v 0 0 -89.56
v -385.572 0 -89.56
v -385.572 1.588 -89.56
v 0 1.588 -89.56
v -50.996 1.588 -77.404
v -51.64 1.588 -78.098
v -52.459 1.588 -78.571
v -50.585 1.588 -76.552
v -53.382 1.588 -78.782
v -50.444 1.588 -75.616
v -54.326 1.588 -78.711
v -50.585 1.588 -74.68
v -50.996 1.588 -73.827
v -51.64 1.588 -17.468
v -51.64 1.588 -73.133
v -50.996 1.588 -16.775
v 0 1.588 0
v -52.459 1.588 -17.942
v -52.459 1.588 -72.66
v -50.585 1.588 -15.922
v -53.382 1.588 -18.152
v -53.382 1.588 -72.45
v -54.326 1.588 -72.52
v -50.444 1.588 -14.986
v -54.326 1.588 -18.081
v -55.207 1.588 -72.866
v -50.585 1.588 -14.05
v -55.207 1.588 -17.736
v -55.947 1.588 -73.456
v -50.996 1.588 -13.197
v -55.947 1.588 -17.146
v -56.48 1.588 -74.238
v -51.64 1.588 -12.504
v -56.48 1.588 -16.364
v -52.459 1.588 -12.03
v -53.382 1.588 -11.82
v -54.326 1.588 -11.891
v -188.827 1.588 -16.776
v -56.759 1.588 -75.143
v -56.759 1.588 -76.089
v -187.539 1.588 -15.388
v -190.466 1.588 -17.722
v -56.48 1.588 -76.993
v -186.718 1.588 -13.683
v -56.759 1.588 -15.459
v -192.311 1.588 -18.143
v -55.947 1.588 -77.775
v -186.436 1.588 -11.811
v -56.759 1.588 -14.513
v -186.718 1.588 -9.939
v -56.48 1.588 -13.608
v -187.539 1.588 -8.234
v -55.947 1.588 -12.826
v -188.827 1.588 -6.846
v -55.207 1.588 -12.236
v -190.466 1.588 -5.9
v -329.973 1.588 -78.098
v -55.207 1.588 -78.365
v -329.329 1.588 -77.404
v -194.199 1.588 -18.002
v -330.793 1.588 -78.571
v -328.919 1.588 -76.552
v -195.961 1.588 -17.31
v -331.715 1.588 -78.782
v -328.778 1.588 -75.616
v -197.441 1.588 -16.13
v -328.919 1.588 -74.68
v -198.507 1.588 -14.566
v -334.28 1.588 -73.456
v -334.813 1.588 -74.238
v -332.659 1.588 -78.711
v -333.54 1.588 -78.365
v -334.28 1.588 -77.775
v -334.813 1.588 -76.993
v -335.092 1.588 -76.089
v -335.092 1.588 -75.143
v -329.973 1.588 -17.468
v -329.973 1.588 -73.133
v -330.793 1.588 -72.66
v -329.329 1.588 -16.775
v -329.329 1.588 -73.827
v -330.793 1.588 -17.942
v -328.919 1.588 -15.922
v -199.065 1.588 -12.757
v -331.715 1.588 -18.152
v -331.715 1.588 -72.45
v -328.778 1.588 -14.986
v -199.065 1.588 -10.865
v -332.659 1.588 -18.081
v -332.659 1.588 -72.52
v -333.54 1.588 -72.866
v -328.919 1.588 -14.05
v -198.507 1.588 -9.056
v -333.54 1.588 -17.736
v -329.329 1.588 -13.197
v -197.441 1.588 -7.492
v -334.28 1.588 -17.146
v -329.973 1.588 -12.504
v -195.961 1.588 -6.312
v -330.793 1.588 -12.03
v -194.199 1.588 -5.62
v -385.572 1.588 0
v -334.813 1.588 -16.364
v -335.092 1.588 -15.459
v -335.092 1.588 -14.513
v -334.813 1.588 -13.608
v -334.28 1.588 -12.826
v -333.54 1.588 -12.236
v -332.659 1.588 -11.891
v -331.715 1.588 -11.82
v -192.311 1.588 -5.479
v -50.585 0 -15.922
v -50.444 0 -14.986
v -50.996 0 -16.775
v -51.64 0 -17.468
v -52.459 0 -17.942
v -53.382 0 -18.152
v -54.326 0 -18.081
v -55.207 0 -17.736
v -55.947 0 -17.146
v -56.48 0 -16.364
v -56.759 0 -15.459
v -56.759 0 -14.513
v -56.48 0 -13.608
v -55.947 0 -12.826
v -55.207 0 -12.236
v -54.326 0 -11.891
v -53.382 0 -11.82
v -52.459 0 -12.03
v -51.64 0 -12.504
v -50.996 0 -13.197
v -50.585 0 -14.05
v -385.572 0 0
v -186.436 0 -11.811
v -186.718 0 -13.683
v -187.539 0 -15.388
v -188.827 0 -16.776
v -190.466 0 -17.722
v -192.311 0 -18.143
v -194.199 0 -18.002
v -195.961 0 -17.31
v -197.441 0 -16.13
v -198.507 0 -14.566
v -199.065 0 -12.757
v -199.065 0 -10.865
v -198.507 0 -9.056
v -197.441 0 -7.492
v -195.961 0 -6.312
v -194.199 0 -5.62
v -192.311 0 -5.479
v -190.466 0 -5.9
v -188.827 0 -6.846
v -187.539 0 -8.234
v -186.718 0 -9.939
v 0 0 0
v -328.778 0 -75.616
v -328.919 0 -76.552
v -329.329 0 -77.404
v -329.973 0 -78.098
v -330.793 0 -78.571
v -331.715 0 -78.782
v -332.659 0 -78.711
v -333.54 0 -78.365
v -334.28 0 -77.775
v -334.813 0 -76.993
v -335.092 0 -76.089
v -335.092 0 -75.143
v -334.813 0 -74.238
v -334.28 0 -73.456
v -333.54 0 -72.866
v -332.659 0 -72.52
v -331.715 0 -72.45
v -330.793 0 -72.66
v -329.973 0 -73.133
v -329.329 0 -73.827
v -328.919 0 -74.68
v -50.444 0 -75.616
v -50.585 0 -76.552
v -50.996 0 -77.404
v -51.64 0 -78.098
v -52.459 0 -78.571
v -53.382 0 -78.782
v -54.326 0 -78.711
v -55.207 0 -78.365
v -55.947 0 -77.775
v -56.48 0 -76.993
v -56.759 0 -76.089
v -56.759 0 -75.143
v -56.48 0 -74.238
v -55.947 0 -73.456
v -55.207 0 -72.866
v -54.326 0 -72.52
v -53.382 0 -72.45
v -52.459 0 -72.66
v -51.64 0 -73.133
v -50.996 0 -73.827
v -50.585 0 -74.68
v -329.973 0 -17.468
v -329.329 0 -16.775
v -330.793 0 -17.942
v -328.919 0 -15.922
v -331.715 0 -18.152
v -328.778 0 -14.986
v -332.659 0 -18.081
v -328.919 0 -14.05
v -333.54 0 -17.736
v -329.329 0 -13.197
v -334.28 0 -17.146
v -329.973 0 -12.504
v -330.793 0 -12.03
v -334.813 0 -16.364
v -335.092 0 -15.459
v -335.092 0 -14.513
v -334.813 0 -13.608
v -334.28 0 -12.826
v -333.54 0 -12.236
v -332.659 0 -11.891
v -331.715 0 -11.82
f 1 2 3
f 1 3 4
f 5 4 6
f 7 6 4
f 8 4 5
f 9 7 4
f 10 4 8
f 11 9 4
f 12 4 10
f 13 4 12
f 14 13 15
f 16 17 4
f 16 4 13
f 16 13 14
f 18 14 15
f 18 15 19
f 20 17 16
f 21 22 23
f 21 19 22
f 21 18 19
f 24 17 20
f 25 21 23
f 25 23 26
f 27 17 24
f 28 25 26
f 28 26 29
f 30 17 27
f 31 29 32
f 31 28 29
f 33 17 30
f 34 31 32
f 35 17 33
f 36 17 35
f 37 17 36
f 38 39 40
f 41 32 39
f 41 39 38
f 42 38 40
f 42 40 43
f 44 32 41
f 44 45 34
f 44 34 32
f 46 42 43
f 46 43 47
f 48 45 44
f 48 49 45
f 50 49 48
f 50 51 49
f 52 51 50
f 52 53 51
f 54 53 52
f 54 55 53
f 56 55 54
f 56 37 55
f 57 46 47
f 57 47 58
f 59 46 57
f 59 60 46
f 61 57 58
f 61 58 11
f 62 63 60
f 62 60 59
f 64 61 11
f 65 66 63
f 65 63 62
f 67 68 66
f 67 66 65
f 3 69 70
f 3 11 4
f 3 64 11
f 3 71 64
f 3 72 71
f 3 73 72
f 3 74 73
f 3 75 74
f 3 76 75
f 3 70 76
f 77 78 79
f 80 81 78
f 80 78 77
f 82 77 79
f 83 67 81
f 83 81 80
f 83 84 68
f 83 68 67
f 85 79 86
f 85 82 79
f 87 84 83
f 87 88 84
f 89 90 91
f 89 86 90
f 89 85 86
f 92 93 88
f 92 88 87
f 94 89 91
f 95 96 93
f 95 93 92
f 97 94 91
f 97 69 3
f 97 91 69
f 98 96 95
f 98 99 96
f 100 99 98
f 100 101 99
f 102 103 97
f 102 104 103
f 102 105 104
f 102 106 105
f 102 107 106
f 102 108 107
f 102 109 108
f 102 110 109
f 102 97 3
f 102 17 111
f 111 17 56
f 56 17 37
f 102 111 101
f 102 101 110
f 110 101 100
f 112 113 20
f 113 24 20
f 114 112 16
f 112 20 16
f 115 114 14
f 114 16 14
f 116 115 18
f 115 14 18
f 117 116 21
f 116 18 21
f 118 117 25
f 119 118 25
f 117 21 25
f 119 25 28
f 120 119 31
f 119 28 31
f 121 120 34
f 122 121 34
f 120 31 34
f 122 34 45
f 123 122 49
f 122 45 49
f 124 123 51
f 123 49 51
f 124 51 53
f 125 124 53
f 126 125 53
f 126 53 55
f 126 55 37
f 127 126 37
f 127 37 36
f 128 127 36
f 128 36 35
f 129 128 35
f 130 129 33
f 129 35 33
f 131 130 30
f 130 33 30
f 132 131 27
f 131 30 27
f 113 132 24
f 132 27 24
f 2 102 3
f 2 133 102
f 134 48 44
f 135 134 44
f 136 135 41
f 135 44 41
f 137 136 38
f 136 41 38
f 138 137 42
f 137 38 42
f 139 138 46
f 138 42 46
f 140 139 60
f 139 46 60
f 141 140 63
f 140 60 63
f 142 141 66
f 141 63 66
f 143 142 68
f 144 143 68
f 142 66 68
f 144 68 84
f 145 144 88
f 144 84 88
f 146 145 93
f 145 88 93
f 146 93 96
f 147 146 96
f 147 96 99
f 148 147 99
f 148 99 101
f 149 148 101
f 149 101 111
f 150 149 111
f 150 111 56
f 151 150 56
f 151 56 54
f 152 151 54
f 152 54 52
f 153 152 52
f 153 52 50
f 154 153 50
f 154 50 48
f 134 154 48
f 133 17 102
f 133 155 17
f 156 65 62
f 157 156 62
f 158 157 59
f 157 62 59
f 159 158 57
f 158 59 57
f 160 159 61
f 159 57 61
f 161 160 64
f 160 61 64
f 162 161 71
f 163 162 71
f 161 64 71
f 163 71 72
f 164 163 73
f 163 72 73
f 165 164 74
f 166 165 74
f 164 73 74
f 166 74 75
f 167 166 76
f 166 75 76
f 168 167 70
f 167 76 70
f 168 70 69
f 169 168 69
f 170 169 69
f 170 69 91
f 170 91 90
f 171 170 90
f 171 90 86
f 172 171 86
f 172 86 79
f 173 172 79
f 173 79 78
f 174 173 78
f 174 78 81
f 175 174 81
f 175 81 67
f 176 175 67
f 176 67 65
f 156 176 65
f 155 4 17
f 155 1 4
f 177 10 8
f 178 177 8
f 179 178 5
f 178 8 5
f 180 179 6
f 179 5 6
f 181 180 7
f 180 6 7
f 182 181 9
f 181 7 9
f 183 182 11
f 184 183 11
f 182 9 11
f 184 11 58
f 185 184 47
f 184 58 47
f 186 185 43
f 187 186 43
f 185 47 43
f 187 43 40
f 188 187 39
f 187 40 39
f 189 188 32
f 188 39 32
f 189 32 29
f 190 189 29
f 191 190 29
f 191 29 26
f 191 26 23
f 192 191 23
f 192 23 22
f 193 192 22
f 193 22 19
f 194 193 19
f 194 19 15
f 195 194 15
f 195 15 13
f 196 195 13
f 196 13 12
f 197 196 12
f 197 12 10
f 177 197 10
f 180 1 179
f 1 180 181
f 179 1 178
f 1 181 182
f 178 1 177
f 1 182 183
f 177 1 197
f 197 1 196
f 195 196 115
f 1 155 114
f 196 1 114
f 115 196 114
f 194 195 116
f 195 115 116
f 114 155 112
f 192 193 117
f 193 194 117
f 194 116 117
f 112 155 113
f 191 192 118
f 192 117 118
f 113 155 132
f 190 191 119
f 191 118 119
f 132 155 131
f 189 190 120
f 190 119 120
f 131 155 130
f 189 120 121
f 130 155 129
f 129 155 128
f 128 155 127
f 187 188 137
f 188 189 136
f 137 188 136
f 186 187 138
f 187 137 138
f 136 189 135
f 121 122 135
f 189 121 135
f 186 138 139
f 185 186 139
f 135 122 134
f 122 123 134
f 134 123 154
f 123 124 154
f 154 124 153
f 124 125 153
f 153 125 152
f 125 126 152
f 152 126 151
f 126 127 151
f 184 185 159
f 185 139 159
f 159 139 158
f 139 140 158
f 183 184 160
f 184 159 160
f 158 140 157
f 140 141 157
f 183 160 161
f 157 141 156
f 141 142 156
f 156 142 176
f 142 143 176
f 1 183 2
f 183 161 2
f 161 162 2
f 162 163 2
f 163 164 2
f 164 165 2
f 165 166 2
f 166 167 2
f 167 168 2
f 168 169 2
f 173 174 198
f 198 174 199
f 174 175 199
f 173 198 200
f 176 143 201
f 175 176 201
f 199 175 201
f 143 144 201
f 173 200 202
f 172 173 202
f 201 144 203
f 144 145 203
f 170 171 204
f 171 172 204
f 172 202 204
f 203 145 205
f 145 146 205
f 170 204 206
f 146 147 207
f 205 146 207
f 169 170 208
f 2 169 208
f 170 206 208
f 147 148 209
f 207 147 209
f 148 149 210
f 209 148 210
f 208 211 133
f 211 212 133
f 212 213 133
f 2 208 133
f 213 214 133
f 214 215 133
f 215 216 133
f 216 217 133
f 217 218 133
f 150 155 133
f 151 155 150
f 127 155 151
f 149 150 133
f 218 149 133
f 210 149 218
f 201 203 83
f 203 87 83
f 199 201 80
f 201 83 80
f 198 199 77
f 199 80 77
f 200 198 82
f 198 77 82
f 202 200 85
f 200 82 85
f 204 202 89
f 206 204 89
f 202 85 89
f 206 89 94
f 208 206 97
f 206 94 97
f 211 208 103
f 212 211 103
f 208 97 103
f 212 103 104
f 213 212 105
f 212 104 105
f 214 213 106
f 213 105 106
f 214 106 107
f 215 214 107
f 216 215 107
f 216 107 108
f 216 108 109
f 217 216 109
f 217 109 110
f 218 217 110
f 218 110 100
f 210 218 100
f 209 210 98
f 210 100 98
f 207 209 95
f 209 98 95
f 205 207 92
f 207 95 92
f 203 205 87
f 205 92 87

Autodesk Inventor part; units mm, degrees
ref_plane "YZ Plane" through (0, 0, 0) normal (1, 0, 0) x (0, 1, 0)
ref_plane "XZ Plane" through (0, 0, 0) normal (0, 1, 0) x (-1, 0, 0)
ref_plane "XY Plane" through (0, 0, 0) normal (0, 0, 1) x (1, 0, 0)
sketch "Sketch1" plane through (0, 0, 0) normal (0, 1, 0) x (-1, 0, 0)
  line L0 (0, 0) -> (385.572, 0)
  line L1 (385.572, 0) -> (385.572, -89.5604)
  line L2 (385.572, -89.5604) -> (0, -89.5604)
  line L3 (0, -89.5604) -> (0, 0)
  dimension "d0" = 385.572
  dimension "d1" = 89.5604
extrude "Extrusion1" add sketch "Sketch1" along normal blind 1.5875
sketch "Sketch2" plane through (0, 1.5875, 0) normal (0, 1, 0) x (1, 0, 0)
  line L0 (0, 0) -> (0, 89.5604) projected
  line L1 (-385.572, 0) -> (0, 0) projected
  line L2 (-192.786, 0) -> (-192.786, 32.4011)
  line L3 (-385.572, 89.5604) -> (-385.572, 0) projected
  line L4 (0, 89.5604) -> (-385.572, 89.5604) projected
  line L5 (-331.9526, 89.5604) -> (-318.008, 89.5604) construction
  circle A0 centre (-331.9526, 75.6158) radius 3.175
  circle A1 centre (-331.9526, 14.986) radius 3.175
  circle A2 centre (-53.6194, 75.6158) radius 3.175
  circle A3 centre (-53.6194, 14.986) radius 3.175
  circle A4 centre (-192.786, 11.811) radius 6.35
extrude "Extrusion2" cut sketch "Sketch2" against normal blind 6.35 contours A4 L2 | L2 A4 | A0 | A1 | A2 | A3
equation "\"d7\" = d6"
equation "\"d6\" = 6.35"
properties part number "shortsidepanel"
